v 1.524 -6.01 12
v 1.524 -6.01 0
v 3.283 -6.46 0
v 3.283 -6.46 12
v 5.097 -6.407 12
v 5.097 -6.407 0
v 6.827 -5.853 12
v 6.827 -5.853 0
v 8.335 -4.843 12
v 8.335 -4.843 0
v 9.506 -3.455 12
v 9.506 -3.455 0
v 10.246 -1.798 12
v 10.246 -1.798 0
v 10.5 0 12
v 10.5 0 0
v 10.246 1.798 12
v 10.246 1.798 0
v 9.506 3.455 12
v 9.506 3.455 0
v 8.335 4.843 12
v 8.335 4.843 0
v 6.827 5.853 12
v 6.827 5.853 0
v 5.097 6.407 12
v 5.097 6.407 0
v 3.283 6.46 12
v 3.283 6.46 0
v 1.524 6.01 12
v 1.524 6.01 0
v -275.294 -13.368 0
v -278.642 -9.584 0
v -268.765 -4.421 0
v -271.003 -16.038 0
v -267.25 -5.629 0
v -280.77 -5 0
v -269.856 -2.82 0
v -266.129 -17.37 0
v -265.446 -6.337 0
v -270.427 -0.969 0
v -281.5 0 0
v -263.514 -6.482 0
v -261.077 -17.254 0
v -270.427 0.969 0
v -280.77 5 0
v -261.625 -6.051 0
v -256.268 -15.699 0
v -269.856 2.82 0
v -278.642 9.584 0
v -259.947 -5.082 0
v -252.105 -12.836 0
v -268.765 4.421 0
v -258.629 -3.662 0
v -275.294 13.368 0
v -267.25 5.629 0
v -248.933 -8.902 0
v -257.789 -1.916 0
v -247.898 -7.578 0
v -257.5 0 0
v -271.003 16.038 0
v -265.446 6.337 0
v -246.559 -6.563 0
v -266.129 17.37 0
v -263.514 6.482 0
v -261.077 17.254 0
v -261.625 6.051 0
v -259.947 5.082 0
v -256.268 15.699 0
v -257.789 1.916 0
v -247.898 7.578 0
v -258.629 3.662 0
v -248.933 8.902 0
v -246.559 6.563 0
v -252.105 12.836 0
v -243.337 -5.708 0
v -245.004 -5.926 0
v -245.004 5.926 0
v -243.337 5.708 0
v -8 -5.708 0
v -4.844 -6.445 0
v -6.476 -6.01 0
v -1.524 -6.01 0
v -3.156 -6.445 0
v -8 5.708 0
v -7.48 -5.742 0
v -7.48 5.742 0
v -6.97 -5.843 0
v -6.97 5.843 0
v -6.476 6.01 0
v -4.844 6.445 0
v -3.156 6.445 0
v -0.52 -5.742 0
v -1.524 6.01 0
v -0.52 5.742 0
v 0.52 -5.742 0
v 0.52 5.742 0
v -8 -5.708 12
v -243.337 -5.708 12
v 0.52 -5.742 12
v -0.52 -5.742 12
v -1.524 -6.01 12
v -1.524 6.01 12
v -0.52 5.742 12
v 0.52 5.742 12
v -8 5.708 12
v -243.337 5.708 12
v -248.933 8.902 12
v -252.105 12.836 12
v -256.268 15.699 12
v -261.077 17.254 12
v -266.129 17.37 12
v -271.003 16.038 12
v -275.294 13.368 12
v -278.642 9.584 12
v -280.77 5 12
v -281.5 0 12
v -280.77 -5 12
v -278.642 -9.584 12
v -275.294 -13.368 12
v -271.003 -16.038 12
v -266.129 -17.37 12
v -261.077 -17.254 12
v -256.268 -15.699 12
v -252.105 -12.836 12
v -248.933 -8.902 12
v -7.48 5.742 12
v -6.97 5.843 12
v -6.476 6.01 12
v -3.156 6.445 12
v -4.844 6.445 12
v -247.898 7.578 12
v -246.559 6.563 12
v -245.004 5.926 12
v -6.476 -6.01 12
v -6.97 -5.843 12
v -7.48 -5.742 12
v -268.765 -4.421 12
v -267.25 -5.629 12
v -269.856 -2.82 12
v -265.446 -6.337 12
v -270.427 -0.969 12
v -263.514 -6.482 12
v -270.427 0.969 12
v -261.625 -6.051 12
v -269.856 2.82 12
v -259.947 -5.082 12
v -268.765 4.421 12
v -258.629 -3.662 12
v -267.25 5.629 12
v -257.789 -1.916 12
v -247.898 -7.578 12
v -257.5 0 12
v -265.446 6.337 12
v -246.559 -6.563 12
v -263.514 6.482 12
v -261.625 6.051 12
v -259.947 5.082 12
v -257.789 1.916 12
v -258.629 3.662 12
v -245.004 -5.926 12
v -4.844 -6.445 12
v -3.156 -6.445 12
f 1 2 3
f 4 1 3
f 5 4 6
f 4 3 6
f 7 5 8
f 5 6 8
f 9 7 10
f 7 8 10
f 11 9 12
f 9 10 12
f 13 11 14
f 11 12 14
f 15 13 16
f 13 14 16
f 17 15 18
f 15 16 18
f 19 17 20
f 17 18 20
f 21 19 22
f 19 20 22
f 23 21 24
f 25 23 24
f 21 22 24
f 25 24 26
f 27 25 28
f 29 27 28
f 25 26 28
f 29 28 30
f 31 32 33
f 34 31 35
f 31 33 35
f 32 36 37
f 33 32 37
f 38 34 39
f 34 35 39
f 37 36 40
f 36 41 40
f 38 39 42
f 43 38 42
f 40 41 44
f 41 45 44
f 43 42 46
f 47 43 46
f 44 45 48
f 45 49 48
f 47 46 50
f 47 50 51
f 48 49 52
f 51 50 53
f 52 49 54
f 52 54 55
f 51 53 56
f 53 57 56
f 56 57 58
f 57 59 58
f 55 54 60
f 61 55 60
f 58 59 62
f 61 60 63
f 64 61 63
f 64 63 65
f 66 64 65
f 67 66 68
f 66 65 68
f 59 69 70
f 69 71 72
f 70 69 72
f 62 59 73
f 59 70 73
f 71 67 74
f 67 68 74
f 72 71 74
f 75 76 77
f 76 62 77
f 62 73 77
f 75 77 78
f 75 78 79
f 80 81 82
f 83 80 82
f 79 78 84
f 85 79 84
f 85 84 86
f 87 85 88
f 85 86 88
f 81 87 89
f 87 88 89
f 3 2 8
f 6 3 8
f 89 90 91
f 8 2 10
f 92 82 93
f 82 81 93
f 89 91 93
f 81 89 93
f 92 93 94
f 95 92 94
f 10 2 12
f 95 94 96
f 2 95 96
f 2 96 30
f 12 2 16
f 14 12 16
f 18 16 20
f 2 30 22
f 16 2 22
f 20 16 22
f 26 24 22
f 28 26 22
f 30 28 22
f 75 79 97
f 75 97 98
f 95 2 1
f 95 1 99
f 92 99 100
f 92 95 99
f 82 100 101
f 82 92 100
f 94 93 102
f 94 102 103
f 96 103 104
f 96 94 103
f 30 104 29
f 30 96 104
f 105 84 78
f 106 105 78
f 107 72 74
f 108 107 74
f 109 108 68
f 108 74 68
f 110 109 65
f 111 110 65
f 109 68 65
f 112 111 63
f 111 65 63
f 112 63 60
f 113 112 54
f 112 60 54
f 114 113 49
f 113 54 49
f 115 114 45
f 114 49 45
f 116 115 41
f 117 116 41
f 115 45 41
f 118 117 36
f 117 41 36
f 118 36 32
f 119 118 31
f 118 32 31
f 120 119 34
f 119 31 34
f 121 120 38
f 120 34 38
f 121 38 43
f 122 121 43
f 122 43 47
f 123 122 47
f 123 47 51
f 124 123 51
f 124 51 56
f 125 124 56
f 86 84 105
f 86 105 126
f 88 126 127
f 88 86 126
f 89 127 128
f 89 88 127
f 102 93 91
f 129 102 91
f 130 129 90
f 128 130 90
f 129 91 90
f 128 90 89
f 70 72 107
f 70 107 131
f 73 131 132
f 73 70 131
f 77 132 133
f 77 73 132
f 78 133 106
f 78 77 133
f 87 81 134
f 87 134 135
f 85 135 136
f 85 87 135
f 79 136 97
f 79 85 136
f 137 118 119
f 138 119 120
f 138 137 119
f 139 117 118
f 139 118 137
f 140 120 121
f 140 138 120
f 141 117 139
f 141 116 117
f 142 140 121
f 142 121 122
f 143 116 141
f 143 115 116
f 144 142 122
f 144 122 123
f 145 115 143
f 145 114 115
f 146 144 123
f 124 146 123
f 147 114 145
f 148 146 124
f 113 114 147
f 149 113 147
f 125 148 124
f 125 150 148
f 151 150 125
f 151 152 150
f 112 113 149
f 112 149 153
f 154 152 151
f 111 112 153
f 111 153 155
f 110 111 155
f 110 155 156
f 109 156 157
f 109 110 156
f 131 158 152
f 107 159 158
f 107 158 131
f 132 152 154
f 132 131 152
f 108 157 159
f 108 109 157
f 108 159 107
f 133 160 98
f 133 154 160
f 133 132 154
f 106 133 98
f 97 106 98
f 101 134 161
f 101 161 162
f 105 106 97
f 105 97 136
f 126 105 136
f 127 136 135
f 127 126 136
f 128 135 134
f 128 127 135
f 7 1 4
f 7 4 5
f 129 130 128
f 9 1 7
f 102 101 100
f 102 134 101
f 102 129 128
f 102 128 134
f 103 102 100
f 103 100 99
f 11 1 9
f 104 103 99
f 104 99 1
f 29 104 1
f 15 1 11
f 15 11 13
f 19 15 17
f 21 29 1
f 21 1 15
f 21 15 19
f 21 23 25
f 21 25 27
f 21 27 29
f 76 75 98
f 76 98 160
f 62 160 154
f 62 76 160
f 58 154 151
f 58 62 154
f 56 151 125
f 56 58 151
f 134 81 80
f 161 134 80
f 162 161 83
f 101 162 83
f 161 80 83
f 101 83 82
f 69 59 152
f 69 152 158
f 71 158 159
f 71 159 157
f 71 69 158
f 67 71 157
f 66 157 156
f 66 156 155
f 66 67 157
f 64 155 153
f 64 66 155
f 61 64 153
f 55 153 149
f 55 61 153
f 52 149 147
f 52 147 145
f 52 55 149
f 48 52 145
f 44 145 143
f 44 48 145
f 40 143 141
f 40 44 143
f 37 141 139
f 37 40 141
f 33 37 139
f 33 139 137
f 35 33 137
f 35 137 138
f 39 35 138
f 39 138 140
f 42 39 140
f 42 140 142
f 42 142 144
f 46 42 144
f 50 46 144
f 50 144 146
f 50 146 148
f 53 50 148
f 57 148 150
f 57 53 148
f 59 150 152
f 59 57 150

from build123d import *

# Parameters (mm, degrees)
SKETCH_R  = 6.5
PAD_DEPTH = 12


with BuildPart() as part:
    # Sketch → Pad (new body)
    with BuildSketch(Plane.XY):
        with BuildLine():
            ThreePointArc((-1.52381, 6.009865), (-3.999998, 6.5), (-6.476186, 6.009867))
            ThreePointArc((-7.999993, 5.708247), (-7.223307, 5.784376), (-6.476186, 6.009867))
            Line((-7.999993, 5.708247), (-243.337021, 5.708247))
            ThreePointArc((-248.933244, 8.901847), (-246.558697, 6.562824), (-243.337021, 5.708247))
            ThreePointArc((-248.933244, 8.901847), (-281.5, 0), (-248.933244, -8.901847))
            ThreePointArc((-243.337021, -5.708247), (-246.558697, -6.562824), (-248.933244, -8.901847))
            Line((-7.999993, -5.708247), (-243.337021, -5.708247))
            ThreePointArc((-6.476186, -6.009867), (-7.223307, -5.784376), (-7.999993, -5.708247))
            ThreePointArc((-6.476186, -6.009867), (-3.999998, -6.5), (-1.52381, -6.009865))
            ThreePointArc((1.52381, -6.009865), (0, -5.708244), (-1.52381, -6.009865))
            ThreePointArc((1.52381, -6.009865), (10.5, 0), (1.52381, 6.009865))
            ThreePointArc((-1.52381, 6.009865), (0, 5.708244), (1.52381, 6.009865))
        make_face()
        with Locations((-264, 0)):
            Circle(SKETCH_R, mode=Mode.SUBTRACT)
    extrude(amount=PAD_DEPTH)


solid = part.part
